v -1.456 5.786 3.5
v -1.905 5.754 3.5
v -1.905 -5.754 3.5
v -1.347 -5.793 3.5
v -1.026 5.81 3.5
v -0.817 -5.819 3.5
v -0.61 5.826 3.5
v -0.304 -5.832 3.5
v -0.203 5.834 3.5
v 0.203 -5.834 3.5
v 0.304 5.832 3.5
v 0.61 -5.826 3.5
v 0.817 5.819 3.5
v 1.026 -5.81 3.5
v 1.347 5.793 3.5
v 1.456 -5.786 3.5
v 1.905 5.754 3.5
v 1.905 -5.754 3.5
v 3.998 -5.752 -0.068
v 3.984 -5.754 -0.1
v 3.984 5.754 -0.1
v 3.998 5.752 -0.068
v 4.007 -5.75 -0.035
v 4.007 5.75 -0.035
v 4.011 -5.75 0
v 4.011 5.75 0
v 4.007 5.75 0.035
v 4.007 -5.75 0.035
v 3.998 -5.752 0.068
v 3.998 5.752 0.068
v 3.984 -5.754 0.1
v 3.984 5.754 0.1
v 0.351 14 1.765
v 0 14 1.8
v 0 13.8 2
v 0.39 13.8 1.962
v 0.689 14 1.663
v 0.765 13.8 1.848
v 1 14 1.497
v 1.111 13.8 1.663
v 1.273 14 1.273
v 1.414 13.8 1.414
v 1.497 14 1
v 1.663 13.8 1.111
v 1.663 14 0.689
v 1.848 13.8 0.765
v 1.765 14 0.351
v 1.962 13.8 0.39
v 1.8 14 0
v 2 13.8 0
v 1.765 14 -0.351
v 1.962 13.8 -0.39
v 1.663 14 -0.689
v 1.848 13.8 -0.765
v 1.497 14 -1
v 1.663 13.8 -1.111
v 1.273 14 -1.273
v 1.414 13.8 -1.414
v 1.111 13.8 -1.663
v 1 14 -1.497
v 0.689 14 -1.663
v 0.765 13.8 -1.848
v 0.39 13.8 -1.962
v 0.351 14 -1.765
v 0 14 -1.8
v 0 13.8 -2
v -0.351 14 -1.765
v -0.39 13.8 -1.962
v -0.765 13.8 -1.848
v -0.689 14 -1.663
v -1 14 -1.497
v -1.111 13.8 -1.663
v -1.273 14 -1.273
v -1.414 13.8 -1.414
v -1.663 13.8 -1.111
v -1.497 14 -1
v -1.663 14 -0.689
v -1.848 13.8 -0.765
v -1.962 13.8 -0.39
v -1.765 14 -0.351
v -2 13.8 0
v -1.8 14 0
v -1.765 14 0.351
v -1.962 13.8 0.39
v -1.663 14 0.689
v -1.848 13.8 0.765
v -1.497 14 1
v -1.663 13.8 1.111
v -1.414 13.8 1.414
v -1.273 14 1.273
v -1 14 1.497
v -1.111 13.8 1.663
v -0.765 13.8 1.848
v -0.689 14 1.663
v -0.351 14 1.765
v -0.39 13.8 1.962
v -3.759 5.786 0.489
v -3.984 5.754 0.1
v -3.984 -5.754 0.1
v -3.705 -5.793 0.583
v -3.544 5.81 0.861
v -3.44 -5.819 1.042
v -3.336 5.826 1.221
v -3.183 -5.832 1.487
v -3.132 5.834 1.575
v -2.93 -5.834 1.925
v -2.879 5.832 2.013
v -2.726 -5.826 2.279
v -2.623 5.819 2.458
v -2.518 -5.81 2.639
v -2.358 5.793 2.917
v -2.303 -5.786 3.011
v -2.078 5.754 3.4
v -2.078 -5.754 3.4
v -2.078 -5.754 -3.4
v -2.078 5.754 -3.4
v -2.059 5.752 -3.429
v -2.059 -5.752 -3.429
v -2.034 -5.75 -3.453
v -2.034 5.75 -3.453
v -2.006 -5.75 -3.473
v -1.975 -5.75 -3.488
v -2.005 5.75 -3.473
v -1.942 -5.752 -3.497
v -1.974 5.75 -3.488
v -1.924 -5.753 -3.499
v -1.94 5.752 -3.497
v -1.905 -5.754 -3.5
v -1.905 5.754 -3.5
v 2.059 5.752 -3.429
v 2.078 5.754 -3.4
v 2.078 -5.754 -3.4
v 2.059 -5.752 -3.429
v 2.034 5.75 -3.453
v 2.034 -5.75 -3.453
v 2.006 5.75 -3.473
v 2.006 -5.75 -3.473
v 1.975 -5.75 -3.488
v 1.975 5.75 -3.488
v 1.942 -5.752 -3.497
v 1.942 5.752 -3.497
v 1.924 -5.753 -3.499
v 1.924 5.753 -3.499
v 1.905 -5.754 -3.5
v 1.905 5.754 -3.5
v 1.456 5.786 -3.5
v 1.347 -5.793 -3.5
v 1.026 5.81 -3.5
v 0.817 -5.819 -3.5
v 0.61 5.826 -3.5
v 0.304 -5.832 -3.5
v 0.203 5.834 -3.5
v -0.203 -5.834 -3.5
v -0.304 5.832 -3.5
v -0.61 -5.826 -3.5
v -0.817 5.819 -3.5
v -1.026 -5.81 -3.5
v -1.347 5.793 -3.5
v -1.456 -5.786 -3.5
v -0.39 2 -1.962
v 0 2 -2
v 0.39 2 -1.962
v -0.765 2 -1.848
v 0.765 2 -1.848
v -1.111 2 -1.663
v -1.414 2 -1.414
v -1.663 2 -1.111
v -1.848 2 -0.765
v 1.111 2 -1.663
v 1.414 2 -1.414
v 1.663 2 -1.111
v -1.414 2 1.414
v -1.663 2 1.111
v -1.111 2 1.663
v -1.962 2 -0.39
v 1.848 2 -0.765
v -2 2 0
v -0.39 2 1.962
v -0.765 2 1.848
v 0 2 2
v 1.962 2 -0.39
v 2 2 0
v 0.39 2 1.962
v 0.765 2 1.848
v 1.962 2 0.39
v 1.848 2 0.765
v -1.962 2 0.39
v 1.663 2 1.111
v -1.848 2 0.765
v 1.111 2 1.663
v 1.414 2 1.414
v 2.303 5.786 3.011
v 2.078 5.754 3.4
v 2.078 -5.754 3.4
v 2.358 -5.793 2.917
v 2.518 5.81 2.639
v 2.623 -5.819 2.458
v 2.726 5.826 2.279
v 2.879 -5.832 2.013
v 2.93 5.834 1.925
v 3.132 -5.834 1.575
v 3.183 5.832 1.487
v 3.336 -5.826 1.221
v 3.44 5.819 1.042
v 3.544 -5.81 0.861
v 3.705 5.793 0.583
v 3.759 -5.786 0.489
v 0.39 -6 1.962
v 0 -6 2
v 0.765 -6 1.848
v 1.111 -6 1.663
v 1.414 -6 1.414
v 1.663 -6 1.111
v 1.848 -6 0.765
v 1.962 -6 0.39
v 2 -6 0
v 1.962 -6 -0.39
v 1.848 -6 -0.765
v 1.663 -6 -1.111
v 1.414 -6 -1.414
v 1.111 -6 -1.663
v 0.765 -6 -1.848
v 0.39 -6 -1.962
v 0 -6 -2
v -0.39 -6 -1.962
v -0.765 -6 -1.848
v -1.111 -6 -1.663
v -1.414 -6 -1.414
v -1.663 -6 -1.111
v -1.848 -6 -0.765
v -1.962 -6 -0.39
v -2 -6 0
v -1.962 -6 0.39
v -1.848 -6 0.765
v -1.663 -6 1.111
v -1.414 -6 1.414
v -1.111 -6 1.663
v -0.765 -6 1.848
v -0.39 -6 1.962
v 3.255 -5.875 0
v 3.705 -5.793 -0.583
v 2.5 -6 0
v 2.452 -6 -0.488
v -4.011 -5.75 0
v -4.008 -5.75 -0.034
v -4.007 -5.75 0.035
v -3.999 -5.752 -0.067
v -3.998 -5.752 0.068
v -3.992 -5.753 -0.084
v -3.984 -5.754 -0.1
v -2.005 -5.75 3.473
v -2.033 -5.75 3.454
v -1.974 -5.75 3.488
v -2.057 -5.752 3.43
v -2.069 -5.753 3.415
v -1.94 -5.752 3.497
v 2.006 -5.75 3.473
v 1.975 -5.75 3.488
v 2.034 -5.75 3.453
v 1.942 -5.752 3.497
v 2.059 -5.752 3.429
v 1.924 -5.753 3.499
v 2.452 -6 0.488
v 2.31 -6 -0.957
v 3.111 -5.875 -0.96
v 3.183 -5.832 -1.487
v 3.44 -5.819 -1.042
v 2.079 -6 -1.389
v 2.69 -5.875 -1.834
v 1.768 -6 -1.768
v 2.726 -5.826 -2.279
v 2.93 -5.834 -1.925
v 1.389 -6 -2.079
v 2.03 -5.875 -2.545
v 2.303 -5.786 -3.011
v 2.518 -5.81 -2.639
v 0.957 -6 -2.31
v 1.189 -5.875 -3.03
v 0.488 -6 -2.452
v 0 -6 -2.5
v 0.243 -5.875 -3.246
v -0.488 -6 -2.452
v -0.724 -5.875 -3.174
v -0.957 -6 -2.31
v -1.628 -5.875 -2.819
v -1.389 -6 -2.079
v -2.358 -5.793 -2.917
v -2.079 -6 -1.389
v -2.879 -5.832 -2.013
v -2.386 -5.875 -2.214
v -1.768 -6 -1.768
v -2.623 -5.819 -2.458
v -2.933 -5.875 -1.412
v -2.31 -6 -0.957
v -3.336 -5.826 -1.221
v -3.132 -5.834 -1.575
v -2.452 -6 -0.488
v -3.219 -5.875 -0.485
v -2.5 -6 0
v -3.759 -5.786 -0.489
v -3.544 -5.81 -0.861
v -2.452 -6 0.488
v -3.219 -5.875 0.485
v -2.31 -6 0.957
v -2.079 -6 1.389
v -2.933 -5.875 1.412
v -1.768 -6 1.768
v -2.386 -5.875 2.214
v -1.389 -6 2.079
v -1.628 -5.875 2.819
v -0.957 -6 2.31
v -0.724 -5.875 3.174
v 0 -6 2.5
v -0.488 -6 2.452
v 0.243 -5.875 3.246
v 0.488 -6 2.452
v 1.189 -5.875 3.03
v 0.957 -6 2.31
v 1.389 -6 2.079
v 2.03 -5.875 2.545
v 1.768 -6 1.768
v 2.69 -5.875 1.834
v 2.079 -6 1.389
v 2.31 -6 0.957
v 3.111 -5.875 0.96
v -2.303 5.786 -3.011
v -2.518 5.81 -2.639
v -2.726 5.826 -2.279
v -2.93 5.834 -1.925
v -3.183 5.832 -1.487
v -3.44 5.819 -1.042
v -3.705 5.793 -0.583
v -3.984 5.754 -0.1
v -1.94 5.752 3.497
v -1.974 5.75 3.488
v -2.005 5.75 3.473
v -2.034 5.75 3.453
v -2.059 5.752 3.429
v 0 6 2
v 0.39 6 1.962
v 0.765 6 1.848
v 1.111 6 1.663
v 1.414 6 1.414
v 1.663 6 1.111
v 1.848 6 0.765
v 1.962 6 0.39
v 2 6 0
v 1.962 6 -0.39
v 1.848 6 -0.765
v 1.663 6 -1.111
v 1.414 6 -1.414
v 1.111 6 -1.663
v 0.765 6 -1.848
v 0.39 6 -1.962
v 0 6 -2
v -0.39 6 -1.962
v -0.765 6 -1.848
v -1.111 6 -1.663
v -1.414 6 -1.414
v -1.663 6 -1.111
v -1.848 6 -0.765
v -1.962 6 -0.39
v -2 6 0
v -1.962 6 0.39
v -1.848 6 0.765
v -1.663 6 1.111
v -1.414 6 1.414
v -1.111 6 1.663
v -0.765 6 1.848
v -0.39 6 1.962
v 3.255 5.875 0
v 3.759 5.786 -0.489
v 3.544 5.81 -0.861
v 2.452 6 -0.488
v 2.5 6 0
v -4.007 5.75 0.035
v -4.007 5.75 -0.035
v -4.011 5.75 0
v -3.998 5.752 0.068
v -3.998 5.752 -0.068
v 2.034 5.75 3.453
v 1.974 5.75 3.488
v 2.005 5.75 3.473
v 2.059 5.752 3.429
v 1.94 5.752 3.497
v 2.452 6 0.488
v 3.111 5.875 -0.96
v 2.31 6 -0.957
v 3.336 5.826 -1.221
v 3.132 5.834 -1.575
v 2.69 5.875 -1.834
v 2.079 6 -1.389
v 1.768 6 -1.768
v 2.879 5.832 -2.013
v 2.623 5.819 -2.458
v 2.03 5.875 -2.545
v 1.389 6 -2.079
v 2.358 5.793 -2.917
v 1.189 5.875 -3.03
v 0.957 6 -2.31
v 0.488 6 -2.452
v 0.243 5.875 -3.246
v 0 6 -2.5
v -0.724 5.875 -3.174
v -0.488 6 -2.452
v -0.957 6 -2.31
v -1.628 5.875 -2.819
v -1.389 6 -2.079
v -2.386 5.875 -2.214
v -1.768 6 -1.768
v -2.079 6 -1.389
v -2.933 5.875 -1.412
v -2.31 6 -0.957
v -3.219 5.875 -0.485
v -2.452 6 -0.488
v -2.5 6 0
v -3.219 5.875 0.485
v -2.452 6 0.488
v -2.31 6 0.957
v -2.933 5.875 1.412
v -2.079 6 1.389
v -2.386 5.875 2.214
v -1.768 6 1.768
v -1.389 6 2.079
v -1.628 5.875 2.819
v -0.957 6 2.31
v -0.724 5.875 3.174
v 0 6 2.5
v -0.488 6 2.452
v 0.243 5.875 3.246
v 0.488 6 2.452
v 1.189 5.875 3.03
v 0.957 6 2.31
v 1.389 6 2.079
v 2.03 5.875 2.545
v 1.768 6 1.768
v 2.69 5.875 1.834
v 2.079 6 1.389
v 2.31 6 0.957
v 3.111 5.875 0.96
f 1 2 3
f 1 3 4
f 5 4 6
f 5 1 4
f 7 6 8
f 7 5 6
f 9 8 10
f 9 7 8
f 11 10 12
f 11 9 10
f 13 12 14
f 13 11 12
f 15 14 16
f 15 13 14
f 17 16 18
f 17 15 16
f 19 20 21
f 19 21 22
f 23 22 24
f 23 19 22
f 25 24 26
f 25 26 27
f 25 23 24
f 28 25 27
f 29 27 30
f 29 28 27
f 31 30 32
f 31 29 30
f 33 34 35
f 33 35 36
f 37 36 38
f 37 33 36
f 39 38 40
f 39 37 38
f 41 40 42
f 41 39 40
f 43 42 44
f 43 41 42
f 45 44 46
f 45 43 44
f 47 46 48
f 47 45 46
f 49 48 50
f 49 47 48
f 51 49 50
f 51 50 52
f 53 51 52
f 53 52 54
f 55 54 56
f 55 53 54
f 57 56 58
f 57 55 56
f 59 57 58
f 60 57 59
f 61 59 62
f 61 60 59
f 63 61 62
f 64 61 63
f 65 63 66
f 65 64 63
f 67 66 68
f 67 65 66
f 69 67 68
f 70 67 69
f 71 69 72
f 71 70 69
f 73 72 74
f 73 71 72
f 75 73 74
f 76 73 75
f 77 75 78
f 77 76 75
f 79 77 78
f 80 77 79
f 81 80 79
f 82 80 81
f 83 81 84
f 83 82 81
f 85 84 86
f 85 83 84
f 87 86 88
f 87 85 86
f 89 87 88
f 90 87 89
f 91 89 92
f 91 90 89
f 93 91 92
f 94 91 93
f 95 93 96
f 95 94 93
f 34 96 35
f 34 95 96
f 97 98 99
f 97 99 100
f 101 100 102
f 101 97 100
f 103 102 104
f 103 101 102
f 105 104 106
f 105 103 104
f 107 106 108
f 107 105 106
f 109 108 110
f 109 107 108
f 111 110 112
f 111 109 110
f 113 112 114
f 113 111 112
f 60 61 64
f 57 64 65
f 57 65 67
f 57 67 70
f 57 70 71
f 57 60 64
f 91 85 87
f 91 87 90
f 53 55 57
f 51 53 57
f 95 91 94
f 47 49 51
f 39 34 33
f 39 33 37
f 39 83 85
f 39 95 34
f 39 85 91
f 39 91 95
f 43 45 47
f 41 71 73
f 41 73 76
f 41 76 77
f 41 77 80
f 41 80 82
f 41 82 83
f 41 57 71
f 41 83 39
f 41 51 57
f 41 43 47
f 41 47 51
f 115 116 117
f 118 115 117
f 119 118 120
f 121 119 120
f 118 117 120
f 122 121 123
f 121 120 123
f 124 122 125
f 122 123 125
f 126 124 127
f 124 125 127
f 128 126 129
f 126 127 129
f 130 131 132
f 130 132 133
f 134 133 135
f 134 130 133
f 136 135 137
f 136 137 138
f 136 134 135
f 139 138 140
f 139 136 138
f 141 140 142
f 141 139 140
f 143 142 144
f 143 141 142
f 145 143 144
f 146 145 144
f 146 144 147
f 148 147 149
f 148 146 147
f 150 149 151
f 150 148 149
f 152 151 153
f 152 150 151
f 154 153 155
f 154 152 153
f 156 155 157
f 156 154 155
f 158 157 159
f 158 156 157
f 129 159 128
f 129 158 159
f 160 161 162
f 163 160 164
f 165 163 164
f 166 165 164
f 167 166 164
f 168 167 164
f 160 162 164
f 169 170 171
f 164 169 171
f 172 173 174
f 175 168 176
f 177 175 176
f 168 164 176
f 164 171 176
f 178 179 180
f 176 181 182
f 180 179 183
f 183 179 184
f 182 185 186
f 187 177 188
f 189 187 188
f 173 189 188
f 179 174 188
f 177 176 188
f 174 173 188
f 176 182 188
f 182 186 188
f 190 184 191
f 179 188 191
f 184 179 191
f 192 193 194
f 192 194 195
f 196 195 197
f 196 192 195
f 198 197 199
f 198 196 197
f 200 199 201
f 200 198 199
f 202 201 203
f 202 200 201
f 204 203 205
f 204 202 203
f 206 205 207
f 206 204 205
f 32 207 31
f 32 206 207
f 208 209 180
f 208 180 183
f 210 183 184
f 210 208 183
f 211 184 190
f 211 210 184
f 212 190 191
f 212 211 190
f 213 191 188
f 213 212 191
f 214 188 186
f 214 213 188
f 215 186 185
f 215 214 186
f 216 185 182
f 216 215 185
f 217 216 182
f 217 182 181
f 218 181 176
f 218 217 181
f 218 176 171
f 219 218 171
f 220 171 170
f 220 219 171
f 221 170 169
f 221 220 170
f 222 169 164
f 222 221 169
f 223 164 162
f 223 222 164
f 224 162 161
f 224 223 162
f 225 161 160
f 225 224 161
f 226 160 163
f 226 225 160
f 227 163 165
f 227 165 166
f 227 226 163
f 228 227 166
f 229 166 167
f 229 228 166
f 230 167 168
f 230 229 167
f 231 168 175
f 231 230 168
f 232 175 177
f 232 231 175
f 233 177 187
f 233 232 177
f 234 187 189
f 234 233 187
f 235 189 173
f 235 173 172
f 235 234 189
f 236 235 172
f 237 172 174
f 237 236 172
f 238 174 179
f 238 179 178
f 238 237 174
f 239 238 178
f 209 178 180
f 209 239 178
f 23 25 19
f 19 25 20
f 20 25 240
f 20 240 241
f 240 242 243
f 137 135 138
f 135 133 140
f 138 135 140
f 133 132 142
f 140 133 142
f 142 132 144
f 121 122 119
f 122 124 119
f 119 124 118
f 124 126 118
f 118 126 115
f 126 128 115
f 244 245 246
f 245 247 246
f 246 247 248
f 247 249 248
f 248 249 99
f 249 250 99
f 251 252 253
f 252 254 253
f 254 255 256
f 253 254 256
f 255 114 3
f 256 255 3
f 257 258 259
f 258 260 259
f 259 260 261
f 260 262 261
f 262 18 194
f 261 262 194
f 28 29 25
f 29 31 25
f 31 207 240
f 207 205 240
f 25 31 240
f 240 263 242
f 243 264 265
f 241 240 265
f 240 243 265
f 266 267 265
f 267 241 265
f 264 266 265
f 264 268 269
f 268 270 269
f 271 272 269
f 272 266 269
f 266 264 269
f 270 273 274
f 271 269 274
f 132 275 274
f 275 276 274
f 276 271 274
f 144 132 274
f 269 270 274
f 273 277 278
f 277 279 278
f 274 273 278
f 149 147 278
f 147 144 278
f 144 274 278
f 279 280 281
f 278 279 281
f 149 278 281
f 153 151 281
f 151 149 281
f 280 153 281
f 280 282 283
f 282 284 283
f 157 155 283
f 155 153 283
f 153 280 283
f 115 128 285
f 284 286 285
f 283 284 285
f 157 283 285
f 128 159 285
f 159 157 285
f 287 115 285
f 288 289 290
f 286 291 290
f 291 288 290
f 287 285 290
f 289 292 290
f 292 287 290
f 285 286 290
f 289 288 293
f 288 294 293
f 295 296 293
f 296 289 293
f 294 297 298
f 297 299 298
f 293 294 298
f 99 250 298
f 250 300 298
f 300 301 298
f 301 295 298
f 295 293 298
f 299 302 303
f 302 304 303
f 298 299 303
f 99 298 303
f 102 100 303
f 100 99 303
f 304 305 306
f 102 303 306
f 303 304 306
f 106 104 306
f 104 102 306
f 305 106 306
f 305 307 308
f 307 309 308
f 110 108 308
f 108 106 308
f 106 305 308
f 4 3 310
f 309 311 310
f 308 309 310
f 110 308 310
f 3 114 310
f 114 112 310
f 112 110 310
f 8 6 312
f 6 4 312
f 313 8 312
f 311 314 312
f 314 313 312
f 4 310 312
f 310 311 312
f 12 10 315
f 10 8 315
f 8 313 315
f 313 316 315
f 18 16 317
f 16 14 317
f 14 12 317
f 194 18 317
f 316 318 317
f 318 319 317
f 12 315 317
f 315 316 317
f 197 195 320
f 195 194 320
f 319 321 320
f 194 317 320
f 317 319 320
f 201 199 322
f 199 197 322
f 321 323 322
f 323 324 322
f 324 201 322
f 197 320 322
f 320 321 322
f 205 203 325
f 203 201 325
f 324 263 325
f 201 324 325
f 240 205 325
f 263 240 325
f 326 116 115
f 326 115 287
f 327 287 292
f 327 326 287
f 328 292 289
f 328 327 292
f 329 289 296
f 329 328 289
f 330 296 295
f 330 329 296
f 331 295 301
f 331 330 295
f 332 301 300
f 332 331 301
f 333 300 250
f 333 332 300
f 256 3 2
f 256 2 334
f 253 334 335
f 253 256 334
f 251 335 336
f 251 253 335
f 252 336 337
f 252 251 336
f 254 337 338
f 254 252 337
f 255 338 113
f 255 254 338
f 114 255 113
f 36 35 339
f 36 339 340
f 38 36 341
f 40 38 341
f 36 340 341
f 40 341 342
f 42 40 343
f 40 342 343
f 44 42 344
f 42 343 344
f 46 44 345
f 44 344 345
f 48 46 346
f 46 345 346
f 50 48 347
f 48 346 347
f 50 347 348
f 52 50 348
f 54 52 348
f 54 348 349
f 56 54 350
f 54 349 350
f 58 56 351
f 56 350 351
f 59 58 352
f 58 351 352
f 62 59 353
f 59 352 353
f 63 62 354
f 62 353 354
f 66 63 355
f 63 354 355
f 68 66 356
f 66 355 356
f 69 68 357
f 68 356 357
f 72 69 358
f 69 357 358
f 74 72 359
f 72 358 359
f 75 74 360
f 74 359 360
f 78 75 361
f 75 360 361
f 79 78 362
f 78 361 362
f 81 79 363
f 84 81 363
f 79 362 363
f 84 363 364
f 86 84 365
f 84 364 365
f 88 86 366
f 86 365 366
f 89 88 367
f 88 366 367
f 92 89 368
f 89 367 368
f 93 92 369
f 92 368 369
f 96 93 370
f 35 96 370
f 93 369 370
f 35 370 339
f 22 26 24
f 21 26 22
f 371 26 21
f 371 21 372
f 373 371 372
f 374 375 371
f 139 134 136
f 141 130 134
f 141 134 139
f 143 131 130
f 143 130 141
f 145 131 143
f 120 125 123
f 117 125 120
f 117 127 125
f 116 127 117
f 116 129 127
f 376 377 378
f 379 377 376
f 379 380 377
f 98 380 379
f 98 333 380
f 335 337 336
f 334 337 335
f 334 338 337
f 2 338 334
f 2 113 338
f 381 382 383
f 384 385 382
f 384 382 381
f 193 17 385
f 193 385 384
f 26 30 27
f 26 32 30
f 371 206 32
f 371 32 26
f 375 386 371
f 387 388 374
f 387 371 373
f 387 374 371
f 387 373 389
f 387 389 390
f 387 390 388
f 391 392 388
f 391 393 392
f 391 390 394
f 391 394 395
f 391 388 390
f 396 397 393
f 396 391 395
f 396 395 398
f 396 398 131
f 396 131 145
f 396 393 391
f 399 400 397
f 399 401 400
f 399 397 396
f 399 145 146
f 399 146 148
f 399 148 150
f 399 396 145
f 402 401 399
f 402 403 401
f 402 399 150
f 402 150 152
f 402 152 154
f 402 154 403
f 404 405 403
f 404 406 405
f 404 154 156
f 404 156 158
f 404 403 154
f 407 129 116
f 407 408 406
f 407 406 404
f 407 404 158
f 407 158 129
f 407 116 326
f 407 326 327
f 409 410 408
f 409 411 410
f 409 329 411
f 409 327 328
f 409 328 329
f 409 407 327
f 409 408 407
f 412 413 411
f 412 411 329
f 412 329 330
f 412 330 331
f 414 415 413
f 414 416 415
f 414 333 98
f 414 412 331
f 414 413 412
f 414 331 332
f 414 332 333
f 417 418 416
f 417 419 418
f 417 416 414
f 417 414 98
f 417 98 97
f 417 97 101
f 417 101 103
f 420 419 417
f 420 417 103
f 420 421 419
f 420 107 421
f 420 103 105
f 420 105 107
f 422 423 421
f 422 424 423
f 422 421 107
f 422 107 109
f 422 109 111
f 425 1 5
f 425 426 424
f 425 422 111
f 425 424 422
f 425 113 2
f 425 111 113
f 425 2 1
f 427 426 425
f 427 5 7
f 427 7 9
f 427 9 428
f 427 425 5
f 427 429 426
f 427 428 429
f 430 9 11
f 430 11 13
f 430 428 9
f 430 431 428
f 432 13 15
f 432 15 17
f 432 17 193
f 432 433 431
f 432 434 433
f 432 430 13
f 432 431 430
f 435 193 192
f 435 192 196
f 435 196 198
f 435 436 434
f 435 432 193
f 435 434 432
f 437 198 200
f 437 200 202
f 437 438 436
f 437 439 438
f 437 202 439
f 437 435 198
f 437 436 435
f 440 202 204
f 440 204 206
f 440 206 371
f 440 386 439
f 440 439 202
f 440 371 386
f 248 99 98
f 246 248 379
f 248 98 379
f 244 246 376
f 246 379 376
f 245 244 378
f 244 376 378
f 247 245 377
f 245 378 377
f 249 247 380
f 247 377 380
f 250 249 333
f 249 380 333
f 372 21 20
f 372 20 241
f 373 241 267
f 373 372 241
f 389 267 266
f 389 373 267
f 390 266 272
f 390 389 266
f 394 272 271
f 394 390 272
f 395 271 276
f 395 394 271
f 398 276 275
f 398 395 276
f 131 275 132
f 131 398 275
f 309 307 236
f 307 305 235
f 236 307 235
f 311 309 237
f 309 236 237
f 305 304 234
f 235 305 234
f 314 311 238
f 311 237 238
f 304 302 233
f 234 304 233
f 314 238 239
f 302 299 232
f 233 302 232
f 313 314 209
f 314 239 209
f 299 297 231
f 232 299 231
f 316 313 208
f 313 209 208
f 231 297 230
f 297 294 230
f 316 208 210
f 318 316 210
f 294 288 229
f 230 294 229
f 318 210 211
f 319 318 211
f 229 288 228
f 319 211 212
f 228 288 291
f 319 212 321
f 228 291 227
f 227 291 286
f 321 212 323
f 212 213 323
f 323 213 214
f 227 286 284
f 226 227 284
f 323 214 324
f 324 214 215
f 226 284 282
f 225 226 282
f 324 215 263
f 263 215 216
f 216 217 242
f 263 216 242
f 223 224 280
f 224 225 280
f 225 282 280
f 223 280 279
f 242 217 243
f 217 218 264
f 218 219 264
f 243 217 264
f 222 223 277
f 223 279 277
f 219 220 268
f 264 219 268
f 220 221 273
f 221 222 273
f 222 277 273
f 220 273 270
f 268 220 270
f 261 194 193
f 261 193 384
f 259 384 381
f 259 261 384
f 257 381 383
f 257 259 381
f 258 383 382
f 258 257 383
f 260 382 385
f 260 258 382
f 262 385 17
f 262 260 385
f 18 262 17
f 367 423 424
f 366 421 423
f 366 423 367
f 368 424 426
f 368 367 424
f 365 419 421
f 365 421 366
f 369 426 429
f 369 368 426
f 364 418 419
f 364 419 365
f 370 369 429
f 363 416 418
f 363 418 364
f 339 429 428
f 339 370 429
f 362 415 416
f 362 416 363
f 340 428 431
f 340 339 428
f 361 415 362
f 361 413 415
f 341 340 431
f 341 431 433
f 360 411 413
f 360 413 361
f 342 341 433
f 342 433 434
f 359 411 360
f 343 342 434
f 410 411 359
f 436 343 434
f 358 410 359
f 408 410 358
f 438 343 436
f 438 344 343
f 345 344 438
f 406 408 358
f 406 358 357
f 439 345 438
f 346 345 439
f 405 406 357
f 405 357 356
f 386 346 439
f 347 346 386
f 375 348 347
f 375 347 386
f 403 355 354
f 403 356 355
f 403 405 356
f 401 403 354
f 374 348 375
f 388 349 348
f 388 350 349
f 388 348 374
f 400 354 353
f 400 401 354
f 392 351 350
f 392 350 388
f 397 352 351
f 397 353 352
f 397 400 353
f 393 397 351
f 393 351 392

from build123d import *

# Parameters (mm, degrees)
EXTRUDE_1_DEPTH     = 6
FILLET_1_R          = 0.2
SKETCH_3_R          = 2
CUT_EXTRUDE_1_DEPTH = 8
SKETCH_5_R          = 2
EXTRUDE_2_DEPTH     = 8
CHAMFER_1_SIZE      = 0.2


with BuildPart() as part:
    # 草图1 → 凸台-拉伸1 (new, symmetric)
    with BuildSketch(Plane(origin=(0, 0, 0), x_dir=(1, 0, 0), z_dir=(0, 1, 0))):
        Polygon((4.041451884, 0), (2.020725942, 3.5), (-2.020725942, 3.5), (-4.041451884, 0), (-2.020725942, -3.5), (2.020725942, -3.5), align=None)
    extrude(amount=EXTRUDE_1_DEPTH, both=True)

    # 圆角1
    fillet_1_edges = [part.edges().sort_by_distance(p)[0] for p in [
        (2.020725942, 0, 3.5),
        (-2.020725942, 0, 3.5),
        (-4.041451884, 0, 0),
        (-2.020725942, 0, -3.5),
        (2.020725942, 0, -3.5),
        (4.041451884, 0, 0),
    ]]
    fillet(fillet_1_edges, radius=FILLET_1_R)

    # 草图3 → 切除-拉伸1 (cut)
    with BuildSketch(Plane(origin=(0, -6, 0), x_dir=(1, 0, 0), z_dir=(0, 1, 0))):
        with Locations(Location((0, 0, 0), (0, 0, 270))):
            Circle(SKETCH_3_R)
    extrude(amount=CUT_EXTRUDE_1_DEPTH, mode=Mode.SUBTRACT)

    # 草图4 → 切除-旋转1 (revolve, cut)
    with BuildSketch(Plane.XY, mode=Mode.PRIVATE) as cut_revolve_1_sk:
        Polygon((-4.010511777, 6), (-4.010511777, 5.75), (-2.5, 6), align=None)
    cut_revolve_1 = revolve(cut_revolve_1_sk.sketch.rotate(Axis((0, 0, 0), (0, 1, 0)), 180), axis=Axis((0, 0, 0), (0, 1, 0)), mode=Mode.SUBTRACT)

    # 镜向1: 切除-旋转1 across plane
    add(cut_revolve_1.mirror(Plane.ZX), mode=Mode.SUBTRACT)

    # 草图5 → 凸台-拉伸2 (add)
    with BuildSketch(Plane(origin=(0, 6, 0), x_dir=(1, 0, 0), z_dir=(0, 1, 0))):
        with Locations(Location((0, 0, 0), (0, 0, 270))):
            Circle(SKETCH_5_R)
    extrude(amount=EXTRUDE_2_DEPTH)

    # 倒角1
    chamfer_1_edges = [part.edges().sort_by_distance(p)[0] for p in [
        (0, 14, -2),
    ]]
    chamfer(chamfer_1_edges, length=CHAMFER_1_SIZE)


solid = part.part
